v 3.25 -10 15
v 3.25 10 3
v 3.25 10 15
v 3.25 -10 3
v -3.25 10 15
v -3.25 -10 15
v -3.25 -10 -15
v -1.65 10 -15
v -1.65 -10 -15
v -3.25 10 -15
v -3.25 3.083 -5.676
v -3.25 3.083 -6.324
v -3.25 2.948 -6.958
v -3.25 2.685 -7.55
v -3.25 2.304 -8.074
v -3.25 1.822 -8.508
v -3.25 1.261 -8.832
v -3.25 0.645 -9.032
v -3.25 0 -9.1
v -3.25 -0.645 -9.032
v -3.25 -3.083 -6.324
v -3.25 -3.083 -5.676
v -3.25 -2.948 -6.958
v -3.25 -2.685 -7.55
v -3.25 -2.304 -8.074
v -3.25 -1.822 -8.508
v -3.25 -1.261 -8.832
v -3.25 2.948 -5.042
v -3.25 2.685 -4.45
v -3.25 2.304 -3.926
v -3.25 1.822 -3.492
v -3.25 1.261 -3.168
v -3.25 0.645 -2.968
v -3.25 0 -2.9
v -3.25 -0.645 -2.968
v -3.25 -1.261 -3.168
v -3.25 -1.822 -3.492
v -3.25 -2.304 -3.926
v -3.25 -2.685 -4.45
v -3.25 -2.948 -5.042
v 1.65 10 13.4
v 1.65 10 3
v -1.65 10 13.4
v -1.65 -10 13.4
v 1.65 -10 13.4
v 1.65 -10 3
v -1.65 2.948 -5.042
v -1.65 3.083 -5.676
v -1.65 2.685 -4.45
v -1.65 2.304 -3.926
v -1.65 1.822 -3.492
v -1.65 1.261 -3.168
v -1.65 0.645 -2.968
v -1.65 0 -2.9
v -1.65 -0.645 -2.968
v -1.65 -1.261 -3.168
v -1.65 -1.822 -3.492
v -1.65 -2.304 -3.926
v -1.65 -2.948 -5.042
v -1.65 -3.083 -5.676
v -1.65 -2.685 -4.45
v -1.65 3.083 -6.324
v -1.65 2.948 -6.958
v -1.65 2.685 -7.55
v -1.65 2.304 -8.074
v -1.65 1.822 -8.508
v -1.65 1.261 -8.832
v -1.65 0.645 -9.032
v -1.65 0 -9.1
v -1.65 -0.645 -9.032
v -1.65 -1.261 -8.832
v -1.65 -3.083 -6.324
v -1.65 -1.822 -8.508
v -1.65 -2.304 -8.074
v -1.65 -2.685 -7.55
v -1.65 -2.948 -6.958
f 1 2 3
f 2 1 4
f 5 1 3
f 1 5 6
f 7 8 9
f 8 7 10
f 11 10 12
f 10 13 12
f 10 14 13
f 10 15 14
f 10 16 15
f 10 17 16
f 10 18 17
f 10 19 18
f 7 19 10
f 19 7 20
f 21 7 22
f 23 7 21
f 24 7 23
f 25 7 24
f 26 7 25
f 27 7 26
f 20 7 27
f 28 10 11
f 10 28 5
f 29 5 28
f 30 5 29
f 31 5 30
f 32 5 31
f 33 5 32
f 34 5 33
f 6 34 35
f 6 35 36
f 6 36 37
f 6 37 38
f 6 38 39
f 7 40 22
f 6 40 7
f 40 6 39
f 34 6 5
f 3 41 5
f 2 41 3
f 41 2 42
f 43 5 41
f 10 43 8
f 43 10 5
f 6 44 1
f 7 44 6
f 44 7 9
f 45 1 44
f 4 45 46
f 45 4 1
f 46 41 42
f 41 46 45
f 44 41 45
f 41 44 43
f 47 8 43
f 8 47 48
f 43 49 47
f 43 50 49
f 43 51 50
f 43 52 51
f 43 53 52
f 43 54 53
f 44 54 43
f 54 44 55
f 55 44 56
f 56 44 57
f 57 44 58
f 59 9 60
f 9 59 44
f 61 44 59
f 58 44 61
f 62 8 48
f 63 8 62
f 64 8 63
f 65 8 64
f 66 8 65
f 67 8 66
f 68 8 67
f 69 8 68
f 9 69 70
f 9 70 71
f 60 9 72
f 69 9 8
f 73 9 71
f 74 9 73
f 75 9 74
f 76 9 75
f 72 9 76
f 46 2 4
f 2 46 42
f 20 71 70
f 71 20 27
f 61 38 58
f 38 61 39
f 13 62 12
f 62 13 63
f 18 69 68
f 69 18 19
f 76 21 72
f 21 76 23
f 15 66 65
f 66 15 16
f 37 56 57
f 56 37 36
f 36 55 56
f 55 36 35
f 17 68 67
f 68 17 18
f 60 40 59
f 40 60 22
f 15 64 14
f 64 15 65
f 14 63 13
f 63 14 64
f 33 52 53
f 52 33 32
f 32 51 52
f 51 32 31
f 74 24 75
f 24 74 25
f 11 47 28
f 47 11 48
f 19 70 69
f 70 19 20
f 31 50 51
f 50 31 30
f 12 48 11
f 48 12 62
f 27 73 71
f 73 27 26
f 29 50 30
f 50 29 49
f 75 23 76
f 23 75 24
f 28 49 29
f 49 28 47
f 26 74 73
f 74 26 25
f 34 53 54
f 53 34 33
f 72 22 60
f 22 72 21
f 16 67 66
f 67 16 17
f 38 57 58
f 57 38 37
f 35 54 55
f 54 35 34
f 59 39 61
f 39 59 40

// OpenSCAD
$fn = 30;

wall_with = 3.3;
thinkness = 1.6;

highet = 30;
width = 20;

cut_highet = 18;

screw_radious = 3.1;

difference() {
    color ("green") cube([wall_with+thinkness*2,width,highet], center=true);
    
    // The slot
    translate([0,0,-thinkness])
      cube([wall_with,width+1,highet], center = true);
      
    // cut so we can place screw
    color("red")
    translate([thinkness,0,cut_highet*.5-highet/2])
      cube([wall_with+thinkness,width+1,cut_highet], center = true);
    
    
    color("blue")
    translate([0,0,cut_highet*.5-highet/2])
      rotate([0,90,0])
       cylinder(r=screw_radious, h = 5 * (wall_with + 2*thinkness), center = true);
    }
